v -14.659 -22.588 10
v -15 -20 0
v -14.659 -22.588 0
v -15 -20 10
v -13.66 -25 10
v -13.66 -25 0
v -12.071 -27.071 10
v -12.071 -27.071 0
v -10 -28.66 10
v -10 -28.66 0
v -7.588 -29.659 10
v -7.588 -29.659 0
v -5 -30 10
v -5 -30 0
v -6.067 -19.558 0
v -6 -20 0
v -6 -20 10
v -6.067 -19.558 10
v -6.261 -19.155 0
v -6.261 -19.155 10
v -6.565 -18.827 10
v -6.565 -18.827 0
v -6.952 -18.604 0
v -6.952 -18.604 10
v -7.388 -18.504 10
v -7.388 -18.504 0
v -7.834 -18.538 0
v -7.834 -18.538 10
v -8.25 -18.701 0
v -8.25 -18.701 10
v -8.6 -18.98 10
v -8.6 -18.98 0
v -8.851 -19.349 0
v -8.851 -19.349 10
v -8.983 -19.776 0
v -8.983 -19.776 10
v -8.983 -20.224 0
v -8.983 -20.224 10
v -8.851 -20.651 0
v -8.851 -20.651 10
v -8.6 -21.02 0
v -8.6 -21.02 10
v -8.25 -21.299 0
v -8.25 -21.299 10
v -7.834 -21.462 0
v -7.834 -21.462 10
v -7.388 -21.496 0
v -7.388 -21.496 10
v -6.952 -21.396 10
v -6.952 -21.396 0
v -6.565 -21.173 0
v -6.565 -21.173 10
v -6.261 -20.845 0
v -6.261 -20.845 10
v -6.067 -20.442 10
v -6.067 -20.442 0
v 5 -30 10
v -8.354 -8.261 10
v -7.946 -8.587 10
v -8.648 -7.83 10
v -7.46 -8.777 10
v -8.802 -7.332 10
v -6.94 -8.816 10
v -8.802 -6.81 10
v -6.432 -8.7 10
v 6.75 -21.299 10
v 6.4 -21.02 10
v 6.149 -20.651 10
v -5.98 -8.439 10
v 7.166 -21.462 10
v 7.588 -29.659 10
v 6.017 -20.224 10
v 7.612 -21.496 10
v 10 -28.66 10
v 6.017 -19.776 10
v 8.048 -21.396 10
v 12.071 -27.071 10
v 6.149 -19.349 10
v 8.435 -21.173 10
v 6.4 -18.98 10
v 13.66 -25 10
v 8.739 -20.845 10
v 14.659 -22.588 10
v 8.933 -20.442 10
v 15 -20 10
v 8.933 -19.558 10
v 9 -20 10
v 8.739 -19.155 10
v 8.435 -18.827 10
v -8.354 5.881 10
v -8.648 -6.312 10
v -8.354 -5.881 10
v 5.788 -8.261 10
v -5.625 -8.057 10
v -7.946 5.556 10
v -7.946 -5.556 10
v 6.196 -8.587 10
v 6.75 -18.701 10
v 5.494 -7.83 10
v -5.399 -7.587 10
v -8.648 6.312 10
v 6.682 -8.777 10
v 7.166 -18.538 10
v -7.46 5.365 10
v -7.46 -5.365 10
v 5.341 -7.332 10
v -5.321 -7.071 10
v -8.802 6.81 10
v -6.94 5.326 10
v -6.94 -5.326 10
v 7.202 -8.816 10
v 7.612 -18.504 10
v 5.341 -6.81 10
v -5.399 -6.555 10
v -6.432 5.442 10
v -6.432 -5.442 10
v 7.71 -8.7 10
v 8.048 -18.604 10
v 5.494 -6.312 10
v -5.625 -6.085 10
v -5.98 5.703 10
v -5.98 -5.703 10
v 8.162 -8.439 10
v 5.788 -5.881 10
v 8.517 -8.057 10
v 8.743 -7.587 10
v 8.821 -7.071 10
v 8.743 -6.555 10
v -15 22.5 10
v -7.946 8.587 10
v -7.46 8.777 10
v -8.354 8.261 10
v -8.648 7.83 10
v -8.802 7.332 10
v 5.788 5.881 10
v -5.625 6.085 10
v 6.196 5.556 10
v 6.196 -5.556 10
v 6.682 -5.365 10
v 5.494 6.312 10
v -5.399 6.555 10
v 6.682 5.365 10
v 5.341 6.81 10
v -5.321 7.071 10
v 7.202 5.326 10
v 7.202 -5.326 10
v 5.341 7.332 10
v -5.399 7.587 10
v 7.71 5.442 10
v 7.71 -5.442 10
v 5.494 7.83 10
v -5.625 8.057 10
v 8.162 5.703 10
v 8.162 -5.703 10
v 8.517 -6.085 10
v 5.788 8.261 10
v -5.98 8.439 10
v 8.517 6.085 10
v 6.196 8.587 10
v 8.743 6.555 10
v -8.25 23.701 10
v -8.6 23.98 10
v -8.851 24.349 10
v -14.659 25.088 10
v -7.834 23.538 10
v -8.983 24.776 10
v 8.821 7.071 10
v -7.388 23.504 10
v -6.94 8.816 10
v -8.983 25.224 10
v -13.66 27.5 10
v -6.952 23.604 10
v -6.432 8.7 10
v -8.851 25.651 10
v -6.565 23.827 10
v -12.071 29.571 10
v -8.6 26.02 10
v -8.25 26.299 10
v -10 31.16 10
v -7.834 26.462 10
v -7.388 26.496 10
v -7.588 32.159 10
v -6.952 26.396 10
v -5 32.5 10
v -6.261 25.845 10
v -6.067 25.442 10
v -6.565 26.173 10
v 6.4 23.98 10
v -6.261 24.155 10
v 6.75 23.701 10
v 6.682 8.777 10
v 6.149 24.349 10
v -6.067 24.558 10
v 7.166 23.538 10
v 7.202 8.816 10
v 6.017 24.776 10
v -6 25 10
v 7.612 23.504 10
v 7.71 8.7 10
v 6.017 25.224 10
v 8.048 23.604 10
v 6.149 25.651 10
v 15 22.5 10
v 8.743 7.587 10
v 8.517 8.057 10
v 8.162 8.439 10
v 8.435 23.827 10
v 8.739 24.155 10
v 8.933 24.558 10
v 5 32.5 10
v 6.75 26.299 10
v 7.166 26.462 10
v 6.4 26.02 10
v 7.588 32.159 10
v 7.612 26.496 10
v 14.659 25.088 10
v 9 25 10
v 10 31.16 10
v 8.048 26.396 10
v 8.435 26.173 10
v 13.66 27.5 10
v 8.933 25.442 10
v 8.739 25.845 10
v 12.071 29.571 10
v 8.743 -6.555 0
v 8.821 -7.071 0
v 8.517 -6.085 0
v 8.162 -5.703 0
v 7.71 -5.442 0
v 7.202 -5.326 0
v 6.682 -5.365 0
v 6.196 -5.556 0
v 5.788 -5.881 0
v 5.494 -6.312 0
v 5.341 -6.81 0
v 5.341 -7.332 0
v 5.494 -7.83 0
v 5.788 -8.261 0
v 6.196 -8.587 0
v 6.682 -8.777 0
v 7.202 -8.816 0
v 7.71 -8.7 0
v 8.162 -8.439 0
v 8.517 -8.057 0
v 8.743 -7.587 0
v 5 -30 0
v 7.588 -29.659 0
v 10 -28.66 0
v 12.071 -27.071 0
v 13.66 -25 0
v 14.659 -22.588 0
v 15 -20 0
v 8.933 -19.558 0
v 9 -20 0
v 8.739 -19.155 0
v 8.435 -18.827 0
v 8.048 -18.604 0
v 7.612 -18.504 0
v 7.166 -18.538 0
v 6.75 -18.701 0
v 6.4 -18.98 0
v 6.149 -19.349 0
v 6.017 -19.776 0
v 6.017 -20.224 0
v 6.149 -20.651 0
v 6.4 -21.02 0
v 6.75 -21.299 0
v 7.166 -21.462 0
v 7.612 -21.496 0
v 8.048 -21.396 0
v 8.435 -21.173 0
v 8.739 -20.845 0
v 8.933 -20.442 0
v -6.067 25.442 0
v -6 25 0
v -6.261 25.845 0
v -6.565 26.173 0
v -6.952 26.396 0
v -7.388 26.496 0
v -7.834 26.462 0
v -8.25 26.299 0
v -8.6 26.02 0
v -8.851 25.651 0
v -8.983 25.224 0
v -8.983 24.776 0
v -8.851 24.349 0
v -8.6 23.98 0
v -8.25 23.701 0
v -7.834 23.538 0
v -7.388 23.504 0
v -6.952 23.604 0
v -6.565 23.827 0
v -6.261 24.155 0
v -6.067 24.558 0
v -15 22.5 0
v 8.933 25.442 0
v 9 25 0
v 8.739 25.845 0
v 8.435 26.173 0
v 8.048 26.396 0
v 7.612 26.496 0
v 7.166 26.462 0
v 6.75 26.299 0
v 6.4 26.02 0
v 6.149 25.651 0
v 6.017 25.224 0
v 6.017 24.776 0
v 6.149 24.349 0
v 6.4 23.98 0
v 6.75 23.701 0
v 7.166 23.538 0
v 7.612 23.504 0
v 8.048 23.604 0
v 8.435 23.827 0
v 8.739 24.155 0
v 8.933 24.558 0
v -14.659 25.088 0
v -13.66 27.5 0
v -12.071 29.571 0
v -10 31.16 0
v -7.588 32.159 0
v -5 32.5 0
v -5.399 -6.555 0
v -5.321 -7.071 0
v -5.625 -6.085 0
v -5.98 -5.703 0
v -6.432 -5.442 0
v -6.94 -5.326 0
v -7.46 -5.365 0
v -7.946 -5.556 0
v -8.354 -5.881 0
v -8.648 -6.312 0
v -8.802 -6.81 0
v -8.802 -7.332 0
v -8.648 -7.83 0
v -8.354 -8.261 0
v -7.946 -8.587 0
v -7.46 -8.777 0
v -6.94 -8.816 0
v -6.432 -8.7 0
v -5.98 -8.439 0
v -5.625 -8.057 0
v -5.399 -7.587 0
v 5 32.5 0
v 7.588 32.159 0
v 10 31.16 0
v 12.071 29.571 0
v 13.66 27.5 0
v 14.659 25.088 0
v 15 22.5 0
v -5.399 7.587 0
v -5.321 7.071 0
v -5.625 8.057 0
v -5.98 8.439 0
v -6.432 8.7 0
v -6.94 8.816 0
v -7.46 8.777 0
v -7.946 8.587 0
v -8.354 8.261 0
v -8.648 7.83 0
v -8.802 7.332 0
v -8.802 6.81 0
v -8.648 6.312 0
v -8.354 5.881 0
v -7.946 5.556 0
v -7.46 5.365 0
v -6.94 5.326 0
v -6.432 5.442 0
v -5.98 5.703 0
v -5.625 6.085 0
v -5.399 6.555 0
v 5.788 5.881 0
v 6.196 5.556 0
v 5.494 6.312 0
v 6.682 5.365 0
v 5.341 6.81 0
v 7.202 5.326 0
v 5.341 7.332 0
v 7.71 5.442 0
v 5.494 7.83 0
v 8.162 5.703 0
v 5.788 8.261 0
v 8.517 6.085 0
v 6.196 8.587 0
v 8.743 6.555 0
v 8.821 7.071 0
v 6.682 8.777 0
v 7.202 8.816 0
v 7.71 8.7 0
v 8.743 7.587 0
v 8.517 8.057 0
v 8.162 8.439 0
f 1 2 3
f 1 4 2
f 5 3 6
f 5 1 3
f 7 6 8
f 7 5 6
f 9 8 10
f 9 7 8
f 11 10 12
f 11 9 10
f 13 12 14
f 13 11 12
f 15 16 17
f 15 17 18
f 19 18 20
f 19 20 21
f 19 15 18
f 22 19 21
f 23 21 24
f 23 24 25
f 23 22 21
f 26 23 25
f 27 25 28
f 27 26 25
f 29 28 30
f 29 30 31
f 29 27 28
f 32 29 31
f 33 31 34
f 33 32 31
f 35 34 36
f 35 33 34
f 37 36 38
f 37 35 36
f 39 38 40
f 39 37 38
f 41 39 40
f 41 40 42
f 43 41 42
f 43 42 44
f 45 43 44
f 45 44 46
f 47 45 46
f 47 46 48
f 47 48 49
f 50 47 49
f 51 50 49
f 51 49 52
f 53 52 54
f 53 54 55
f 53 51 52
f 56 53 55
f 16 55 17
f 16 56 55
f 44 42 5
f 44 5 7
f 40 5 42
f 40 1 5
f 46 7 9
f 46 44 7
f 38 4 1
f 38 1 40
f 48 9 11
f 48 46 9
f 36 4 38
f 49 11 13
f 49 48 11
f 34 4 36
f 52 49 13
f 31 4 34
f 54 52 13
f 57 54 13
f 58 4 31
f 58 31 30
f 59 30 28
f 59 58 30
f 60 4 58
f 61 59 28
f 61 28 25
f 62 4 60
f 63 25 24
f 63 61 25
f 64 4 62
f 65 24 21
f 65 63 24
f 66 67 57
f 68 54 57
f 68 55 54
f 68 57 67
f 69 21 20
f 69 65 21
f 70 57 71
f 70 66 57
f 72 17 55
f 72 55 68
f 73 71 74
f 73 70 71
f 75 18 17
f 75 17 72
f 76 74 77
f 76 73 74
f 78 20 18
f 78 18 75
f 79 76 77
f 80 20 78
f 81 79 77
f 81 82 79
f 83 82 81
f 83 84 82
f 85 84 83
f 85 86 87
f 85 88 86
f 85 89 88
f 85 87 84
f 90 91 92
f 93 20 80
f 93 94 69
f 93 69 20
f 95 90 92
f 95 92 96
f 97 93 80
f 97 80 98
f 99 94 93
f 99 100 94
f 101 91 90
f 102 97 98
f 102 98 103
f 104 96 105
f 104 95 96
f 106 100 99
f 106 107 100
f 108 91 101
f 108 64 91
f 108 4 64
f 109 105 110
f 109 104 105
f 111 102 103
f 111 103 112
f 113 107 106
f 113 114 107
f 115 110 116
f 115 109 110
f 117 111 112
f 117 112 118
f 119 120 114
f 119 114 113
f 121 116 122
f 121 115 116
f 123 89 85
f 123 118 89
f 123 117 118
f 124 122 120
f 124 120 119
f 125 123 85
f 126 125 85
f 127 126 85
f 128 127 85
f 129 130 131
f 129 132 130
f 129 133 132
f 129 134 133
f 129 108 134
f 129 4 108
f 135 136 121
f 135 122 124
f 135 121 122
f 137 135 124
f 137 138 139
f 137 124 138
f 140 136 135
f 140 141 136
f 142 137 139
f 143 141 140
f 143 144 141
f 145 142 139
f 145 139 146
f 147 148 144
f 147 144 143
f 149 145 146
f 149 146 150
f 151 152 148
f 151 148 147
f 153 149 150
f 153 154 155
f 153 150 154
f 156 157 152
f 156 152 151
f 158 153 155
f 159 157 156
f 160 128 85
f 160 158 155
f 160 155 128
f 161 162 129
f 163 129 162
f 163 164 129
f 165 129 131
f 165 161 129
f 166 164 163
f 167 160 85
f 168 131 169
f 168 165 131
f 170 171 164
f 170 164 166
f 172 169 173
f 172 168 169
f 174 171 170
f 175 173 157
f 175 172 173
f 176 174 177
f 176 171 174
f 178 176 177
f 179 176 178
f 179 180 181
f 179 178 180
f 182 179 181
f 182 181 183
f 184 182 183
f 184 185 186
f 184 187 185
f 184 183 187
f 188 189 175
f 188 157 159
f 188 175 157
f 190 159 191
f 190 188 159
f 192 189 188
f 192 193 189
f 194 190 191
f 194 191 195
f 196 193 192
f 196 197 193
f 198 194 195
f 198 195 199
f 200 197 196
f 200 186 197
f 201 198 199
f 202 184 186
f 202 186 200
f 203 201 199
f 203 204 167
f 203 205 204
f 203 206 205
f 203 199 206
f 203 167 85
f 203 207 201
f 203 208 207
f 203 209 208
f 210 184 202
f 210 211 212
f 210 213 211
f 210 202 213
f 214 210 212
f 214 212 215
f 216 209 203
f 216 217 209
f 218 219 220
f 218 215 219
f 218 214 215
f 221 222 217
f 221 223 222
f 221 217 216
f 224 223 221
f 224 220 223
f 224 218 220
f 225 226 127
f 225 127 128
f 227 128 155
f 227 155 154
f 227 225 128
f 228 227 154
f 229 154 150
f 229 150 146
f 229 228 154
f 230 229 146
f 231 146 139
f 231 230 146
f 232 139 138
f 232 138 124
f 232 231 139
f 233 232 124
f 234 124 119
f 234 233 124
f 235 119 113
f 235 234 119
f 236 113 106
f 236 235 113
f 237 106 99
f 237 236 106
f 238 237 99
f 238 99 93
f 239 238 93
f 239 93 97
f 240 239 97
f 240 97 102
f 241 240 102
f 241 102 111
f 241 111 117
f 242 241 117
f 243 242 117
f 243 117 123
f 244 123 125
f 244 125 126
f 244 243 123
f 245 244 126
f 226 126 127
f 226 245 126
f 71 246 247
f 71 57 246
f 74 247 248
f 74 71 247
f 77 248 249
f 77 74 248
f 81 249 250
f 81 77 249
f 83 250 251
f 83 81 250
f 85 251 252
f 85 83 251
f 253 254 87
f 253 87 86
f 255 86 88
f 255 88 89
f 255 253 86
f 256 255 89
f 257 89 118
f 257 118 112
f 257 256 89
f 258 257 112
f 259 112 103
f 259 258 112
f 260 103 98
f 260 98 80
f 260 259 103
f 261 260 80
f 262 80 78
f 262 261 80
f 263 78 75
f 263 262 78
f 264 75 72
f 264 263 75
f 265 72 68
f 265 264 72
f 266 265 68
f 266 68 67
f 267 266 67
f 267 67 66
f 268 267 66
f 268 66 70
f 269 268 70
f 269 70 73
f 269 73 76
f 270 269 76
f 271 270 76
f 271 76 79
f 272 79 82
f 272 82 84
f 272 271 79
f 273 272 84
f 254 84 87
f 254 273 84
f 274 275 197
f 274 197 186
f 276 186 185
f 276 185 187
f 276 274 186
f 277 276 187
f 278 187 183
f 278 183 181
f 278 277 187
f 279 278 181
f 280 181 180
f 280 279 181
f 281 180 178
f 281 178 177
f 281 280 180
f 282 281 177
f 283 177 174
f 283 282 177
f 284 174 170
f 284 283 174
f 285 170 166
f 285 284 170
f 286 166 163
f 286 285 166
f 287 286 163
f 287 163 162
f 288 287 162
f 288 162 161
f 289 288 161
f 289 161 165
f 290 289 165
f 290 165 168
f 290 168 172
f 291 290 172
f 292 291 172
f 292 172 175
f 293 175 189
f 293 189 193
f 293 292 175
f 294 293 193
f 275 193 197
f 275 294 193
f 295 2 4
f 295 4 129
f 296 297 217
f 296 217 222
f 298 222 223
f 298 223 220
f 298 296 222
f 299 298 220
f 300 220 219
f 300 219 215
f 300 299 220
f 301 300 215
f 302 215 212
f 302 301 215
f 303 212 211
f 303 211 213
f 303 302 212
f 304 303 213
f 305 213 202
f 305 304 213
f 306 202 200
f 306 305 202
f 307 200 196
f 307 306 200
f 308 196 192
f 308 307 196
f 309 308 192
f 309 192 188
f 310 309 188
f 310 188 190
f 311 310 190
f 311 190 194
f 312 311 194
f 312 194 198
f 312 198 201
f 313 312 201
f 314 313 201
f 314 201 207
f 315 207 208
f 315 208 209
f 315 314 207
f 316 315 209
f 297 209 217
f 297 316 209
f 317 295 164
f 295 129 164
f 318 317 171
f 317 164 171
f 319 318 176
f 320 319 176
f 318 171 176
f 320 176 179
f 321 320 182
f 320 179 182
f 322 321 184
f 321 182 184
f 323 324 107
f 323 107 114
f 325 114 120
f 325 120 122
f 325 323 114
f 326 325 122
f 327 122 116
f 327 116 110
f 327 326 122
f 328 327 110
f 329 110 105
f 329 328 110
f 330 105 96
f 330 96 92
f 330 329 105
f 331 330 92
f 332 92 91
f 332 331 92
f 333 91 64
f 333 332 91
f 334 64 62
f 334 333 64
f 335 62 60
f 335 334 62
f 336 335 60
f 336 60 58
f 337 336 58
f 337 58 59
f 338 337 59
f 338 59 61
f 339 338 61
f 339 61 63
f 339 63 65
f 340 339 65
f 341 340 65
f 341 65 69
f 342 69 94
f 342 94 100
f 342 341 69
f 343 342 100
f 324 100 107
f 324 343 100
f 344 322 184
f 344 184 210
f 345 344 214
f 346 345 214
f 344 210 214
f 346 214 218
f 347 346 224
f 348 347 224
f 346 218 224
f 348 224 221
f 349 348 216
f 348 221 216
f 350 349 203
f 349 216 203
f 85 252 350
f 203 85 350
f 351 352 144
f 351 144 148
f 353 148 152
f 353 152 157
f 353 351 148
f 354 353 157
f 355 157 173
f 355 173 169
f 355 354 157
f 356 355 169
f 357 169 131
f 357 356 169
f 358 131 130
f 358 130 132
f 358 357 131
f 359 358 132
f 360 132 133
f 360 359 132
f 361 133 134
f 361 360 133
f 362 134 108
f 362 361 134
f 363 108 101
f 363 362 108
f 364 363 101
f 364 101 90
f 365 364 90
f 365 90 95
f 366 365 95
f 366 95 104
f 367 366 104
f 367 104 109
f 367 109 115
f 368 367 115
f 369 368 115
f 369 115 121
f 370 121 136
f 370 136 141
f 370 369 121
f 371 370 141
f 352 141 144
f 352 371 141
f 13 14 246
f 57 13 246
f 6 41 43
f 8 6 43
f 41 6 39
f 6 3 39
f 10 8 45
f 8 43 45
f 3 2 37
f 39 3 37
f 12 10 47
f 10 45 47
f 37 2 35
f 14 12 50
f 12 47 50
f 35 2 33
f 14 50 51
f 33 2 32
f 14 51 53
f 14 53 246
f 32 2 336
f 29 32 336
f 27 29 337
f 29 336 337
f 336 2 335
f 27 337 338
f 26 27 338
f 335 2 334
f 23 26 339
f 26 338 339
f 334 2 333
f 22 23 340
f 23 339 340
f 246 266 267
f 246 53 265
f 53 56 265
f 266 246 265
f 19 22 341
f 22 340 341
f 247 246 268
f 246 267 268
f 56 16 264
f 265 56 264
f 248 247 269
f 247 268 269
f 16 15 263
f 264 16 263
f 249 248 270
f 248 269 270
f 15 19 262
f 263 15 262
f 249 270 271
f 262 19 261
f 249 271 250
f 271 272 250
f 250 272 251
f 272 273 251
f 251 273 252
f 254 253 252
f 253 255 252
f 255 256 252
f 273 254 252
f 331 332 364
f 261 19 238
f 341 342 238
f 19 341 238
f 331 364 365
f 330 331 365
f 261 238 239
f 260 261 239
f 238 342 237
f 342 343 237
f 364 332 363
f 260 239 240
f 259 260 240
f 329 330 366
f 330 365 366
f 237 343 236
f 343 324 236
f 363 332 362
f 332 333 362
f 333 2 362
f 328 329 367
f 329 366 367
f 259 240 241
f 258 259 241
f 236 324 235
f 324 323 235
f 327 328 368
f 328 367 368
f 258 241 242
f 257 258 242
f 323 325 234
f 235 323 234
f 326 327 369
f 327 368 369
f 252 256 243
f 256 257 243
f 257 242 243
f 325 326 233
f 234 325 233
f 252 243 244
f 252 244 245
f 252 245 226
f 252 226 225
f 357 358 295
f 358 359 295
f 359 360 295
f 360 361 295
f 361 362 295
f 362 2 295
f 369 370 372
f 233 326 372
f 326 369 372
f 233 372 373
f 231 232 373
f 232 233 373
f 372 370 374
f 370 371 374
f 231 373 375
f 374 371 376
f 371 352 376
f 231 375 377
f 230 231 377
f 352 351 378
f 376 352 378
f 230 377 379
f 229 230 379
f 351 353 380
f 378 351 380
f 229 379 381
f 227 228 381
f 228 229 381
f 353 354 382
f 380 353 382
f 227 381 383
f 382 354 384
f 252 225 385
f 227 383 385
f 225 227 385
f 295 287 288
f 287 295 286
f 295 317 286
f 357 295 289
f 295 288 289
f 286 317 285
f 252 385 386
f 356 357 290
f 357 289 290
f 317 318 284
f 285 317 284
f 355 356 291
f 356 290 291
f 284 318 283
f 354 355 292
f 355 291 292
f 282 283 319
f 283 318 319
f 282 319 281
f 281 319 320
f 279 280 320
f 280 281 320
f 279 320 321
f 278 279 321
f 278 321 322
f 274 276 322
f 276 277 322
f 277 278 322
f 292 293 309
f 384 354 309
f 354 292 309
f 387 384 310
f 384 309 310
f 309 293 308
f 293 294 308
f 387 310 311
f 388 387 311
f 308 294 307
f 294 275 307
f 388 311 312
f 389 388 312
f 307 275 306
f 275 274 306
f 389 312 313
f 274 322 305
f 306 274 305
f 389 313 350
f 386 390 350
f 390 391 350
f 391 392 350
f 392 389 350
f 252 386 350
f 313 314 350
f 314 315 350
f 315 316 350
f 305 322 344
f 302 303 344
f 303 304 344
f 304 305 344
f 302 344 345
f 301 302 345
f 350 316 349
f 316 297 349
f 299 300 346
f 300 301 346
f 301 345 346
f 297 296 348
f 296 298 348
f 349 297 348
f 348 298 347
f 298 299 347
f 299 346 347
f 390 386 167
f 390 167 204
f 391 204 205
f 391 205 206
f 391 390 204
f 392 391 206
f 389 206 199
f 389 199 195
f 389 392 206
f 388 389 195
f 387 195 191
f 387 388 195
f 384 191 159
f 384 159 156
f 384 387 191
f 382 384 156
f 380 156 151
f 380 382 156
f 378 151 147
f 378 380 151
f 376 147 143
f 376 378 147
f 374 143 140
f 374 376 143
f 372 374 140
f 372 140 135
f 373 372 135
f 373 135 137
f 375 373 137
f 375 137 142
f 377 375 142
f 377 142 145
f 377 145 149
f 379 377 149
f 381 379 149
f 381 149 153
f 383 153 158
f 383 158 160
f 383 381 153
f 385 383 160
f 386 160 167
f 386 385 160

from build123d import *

# Parameters (mm, degrees)
SKETCH_1_W      = 30
SKETCH_1_H      = 62.5
SKETCH_1_R      = 1.75
SKETCH_1_R_2    = 1.5
EXTRUDE_1_DEPTH = 10
FILLET_1_R      = 10


with BuildPart() as part:
    # 草图1 → 凸台-拉伸1 (new body)
    with BuildSketch(Plane.XY):
        with Locations((0, 1.25)):
            Rectangle(SKETCH_1_W, SKETCH_1_H)
        with Locations((7.071067812, 7.071067812)):
            Circle(SKETCH_1_R, mode=Mode.SUBTRACT)
        with Locations((-7.071067812, 7.071067812)):
            Circle(SKETCH_1_R, mode=Mode.SUBTRACT)
        with Locations((7.071067812, -7.071067812)):
            Circle(SKETCH_1_R, mode=Mode.SUBTRACT)
        with Locations((-7.071067812, -7.071067812)):
            Circle(SKETCH_1_R, mode=Mode.SUBTRACT)
        with Locations((7.5, 25)):
            Circle(SKETCH_1_R_2, mode=Mode.SUBTRACT)
        with Locations((-7.5, 25)):
            Circle(SKETCH_1_R_2, mode=Mode.SUBTRACT)
        with Locations((7.5, -20)):
            Circle(SKETCH_1_R_2, mode=Mode.SUBTRACT)
        with Locations((-7.5, -20)):
            Circle(SKETCH_1_R_2, mode=Mode.SUBTRACT)
    extrude(amount=EXTRUDE_1_DEPTH)

    # 圆角1
    fillet_1_edges = [part.edges().sort_by_distance(p)[0] for p in [
        (15, -30, 5),
        (-15, -30, 5),
        (-15, 32.5, 5),
        (15, 32.5, 5),
    ]]
    fillet(fillet_1_edges, radius=FILLET_1_R)


solid = part.part
